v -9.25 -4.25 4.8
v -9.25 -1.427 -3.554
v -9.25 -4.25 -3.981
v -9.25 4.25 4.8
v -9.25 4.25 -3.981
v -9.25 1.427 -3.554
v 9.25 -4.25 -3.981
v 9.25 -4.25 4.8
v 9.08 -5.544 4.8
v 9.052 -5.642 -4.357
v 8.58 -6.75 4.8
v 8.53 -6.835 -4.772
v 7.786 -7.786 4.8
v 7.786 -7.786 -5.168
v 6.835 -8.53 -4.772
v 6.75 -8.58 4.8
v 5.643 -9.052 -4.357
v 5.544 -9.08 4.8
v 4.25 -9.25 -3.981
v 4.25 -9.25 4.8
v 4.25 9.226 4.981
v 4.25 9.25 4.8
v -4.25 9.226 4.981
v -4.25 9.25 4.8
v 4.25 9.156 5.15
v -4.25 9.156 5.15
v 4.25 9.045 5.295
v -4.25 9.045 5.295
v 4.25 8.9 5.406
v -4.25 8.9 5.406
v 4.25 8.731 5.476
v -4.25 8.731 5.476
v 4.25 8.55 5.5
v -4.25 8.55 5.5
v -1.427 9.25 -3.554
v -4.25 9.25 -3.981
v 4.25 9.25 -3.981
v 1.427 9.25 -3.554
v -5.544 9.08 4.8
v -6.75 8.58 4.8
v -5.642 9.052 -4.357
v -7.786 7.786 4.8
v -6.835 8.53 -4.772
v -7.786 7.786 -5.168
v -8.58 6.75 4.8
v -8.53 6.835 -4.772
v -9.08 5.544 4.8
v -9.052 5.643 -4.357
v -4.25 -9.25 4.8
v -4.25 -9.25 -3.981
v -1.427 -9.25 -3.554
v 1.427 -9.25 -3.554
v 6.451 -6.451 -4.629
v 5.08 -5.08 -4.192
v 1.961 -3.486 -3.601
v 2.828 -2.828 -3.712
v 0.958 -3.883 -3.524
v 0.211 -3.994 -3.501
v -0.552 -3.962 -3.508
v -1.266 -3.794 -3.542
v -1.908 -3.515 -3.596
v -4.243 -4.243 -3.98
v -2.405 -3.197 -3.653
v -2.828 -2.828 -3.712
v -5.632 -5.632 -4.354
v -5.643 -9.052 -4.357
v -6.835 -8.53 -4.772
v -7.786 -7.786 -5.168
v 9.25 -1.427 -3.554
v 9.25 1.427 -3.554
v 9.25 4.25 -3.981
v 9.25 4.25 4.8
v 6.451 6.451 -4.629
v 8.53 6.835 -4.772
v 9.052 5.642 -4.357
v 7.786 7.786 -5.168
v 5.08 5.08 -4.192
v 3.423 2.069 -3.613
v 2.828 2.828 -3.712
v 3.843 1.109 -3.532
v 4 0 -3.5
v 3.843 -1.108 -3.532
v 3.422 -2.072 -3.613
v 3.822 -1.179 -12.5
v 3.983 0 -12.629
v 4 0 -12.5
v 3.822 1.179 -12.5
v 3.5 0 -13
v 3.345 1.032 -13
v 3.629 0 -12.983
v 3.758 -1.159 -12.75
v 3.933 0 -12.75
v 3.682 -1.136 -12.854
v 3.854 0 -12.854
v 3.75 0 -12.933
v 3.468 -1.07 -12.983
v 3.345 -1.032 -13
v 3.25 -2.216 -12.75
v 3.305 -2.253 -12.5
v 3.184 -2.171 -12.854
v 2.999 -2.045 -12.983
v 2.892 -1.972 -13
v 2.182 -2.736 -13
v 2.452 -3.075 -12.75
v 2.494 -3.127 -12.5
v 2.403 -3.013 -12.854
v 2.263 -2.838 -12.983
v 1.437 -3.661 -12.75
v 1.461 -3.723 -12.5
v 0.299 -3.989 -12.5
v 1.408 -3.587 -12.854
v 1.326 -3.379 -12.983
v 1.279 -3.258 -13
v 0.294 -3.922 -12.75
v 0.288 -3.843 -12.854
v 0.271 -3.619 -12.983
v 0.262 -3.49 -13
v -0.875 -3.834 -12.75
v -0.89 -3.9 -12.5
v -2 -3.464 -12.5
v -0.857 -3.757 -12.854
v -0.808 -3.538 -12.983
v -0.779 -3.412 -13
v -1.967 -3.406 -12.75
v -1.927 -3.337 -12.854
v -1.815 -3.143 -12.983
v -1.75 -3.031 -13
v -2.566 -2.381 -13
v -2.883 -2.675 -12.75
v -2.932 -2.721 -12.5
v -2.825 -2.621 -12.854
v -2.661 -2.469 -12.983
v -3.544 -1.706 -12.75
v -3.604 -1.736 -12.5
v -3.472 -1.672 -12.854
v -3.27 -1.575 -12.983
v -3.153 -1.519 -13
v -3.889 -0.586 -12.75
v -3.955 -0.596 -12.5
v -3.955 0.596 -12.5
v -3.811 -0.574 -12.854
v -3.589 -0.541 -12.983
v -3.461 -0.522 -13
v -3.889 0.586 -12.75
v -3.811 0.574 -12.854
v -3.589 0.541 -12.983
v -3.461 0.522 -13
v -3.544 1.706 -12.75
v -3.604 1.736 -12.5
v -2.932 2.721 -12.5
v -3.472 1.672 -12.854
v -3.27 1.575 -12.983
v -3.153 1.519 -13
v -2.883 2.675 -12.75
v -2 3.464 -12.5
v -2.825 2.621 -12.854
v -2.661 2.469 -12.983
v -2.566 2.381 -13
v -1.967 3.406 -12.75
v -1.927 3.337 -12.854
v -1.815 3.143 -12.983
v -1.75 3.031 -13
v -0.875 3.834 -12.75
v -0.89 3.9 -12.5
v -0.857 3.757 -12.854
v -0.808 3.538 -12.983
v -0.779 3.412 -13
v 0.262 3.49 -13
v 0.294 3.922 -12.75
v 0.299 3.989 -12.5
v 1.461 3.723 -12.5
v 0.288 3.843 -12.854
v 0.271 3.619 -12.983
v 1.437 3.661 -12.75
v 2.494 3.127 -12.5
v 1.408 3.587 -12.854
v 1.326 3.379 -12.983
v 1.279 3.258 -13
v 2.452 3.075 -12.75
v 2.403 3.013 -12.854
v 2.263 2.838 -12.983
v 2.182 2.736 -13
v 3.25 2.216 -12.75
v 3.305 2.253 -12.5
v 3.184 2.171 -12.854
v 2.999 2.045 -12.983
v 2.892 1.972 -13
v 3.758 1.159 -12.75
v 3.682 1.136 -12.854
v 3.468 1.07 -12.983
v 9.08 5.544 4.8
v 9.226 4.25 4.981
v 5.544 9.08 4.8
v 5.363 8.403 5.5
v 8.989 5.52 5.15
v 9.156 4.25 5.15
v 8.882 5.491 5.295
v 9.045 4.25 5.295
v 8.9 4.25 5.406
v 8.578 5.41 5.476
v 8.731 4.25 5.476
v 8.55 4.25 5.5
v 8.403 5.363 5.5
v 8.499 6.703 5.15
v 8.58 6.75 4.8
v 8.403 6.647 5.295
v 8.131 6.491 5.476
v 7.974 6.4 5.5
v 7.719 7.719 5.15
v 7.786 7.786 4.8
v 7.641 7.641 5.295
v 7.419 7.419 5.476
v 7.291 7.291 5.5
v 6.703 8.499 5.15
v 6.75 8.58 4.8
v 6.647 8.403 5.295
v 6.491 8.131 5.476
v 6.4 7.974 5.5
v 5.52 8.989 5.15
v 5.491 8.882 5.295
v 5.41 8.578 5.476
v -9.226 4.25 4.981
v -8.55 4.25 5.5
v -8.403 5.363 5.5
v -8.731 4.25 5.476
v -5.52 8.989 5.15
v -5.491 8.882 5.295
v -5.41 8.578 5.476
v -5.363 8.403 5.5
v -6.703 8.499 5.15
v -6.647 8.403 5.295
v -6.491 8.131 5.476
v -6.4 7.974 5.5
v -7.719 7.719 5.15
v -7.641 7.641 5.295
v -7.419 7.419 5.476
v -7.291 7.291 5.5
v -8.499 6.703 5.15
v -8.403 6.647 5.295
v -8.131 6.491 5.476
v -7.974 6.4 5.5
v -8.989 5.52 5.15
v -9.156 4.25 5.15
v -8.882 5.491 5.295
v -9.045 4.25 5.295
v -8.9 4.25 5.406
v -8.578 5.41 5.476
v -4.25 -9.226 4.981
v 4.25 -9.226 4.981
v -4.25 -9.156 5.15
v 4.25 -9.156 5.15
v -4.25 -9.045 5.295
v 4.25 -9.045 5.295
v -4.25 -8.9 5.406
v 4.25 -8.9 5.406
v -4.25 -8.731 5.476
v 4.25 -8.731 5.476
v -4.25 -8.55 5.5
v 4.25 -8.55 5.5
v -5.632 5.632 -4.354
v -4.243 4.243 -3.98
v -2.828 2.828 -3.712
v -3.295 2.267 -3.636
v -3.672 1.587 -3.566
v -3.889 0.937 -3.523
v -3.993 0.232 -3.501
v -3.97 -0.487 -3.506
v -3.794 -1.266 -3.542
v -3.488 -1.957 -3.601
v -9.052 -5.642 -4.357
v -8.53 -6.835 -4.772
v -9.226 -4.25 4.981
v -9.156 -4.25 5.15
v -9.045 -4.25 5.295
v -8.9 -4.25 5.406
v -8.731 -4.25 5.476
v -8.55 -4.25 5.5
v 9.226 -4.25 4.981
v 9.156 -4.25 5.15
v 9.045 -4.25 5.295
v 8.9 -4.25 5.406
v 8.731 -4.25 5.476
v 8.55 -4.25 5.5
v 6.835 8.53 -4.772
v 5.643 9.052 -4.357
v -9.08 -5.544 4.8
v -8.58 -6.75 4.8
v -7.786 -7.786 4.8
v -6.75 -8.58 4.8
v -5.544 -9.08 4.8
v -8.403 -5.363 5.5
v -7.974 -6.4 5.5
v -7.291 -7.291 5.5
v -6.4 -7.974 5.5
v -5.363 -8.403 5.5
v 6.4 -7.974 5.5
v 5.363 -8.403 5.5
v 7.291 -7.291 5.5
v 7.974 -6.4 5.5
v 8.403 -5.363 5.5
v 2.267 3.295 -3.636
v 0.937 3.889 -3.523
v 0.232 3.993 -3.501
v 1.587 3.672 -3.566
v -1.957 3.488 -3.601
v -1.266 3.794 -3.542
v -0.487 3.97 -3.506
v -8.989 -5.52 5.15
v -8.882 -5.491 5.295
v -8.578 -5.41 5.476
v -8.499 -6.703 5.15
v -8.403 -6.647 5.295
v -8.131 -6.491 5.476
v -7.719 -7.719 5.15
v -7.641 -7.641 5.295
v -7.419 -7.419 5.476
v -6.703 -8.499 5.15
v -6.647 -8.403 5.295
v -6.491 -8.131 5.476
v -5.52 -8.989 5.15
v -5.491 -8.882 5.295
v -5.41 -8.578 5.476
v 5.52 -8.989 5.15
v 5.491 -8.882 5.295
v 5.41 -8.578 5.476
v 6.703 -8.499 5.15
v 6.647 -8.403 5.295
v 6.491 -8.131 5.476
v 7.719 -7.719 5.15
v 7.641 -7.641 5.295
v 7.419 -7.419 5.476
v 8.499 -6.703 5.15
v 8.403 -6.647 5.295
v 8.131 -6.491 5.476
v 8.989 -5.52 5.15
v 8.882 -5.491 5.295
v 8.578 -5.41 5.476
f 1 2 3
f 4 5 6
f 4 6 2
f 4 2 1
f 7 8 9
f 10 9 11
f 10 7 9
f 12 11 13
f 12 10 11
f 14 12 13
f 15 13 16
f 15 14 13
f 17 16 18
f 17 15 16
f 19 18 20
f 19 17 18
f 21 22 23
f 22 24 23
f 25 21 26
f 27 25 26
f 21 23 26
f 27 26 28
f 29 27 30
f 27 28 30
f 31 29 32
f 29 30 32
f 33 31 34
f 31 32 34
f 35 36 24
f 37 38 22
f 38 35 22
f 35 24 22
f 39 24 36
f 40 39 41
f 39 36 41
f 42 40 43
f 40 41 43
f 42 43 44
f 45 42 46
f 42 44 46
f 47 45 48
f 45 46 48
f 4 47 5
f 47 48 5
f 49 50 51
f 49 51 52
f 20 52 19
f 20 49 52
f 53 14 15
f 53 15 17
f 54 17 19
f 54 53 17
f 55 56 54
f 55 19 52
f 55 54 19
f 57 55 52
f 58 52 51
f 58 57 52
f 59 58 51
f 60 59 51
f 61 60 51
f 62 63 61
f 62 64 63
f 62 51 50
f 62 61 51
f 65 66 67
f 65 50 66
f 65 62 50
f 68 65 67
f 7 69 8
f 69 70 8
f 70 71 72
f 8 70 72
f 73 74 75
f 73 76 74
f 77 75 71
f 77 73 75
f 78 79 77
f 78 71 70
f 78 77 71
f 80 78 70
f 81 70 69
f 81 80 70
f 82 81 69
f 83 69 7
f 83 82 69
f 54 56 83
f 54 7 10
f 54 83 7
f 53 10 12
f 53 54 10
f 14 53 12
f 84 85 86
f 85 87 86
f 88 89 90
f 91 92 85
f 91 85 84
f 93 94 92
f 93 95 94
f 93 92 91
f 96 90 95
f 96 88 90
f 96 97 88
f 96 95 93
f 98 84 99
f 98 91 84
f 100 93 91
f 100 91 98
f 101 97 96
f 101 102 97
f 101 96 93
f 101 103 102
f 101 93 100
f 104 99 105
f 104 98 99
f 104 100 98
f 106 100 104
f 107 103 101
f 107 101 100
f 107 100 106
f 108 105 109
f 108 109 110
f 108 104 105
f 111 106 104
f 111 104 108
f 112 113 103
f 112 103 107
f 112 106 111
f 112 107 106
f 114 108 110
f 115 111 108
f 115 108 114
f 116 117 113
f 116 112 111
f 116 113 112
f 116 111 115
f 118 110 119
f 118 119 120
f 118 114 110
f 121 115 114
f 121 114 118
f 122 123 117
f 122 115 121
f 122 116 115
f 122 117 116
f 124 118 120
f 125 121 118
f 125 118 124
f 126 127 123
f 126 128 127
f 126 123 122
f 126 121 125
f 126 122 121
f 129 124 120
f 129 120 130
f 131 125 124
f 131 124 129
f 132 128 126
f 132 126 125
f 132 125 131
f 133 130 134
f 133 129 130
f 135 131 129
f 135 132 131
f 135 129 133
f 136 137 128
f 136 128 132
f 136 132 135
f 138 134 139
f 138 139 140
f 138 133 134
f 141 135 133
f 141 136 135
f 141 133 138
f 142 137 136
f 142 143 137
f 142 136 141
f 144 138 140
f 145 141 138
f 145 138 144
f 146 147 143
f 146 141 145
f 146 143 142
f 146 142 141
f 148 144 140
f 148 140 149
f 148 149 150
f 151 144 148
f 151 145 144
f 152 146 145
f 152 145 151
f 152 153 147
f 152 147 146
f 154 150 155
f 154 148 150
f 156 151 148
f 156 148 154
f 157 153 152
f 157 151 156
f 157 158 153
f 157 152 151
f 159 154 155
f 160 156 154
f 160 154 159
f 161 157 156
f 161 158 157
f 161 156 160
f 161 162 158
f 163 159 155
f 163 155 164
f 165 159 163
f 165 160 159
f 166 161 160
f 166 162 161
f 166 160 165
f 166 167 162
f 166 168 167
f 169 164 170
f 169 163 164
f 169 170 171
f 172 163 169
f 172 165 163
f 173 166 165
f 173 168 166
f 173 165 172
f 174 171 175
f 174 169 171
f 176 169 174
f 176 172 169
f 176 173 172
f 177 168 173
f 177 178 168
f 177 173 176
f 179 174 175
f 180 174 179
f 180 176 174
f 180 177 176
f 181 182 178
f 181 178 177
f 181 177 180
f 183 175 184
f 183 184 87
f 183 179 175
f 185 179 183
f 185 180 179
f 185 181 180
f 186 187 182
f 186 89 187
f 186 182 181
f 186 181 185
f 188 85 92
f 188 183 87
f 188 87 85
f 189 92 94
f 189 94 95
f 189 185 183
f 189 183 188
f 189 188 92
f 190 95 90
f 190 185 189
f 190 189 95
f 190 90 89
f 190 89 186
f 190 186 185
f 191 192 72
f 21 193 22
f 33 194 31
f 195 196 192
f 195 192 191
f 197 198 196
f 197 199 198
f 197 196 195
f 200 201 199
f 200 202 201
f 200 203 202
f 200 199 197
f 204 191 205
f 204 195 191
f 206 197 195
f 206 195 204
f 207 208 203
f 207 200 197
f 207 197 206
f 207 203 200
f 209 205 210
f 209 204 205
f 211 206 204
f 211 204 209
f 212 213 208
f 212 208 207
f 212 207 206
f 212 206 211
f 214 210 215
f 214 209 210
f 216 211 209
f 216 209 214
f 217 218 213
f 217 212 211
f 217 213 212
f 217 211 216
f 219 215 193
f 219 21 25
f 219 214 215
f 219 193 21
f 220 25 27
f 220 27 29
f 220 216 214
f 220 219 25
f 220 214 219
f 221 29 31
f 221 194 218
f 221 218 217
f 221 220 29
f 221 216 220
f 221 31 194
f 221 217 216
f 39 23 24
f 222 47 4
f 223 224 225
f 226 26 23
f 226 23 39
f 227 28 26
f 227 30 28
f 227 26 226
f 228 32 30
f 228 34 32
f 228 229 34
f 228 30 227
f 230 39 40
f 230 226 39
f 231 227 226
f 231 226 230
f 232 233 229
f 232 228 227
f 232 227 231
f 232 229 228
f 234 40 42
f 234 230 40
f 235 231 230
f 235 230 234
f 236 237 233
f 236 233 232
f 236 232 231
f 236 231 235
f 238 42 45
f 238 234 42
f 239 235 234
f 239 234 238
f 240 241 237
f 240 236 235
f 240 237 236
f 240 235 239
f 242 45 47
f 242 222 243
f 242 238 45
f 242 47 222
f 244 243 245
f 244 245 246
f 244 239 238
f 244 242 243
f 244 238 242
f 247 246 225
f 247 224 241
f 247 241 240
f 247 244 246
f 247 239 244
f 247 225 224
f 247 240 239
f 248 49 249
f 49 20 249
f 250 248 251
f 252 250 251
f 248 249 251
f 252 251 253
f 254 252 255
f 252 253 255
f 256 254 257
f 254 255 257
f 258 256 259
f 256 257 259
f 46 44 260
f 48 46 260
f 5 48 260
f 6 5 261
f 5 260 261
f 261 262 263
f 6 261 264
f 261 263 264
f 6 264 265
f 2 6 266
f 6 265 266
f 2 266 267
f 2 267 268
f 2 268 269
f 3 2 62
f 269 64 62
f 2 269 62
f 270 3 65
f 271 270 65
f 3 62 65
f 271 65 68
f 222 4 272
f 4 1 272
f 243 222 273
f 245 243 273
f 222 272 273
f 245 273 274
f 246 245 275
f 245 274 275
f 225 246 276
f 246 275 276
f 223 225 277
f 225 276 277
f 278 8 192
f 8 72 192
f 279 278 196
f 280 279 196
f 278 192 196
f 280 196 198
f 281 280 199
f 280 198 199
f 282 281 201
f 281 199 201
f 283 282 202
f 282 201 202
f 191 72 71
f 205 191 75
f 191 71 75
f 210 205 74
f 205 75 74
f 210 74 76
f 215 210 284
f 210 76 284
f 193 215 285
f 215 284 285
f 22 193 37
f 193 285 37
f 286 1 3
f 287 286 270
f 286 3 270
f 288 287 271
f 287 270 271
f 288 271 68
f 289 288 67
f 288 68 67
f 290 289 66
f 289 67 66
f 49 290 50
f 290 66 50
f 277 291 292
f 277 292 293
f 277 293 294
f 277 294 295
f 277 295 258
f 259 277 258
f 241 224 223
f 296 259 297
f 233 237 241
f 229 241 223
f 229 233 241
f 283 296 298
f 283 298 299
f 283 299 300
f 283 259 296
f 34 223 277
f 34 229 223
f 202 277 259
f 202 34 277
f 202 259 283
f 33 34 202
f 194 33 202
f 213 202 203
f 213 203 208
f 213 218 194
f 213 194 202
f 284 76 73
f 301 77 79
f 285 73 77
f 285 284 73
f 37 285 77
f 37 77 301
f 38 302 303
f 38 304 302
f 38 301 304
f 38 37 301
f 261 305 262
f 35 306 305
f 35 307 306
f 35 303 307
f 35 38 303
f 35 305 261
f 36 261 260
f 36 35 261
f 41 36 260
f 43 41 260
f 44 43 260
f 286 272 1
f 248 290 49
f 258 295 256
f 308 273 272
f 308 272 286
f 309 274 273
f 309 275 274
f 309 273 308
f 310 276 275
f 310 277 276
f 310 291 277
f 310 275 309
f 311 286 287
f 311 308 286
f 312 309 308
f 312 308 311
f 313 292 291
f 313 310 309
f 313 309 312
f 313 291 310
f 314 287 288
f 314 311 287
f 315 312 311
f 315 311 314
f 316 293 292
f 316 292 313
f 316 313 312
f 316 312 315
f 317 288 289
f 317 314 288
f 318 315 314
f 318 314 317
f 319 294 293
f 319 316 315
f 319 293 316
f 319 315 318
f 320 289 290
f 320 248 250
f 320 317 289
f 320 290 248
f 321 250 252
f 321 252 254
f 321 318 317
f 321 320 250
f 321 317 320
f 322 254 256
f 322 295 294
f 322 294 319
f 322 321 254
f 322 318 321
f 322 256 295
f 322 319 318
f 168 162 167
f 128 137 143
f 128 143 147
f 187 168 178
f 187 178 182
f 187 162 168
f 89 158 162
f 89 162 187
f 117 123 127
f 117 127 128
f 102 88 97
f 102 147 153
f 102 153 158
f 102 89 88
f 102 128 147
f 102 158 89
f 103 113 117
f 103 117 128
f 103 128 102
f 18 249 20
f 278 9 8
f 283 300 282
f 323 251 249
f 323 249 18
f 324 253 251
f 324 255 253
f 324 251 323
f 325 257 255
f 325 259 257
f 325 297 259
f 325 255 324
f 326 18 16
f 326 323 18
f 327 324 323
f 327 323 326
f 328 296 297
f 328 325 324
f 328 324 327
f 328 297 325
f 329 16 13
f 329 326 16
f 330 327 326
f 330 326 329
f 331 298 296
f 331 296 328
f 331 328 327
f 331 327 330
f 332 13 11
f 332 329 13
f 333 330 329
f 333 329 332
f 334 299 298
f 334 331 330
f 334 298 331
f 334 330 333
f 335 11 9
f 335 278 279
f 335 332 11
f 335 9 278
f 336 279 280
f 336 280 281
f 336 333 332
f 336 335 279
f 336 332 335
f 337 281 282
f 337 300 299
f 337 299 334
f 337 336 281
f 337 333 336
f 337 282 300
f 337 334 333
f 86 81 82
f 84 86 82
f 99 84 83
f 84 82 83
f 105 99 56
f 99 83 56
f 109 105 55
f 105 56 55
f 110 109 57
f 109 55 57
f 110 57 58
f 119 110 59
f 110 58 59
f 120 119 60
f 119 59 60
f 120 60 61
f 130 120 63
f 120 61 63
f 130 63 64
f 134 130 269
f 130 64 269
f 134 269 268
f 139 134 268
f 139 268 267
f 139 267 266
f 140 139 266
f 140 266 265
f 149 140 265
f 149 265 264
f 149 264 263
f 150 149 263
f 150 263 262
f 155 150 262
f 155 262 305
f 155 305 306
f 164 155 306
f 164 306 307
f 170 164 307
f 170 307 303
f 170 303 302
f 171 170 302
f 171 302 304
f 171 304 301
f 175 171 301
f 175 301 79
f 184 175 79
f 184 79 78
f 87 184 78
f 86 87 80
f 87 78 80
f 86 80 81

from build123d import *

# Parameters (mm, degrees)
F0_W         = 18.5
F0_H         = 11
F1_DEPTH     = 9.25
F2_DEPTH     = 9.25
F3_R         = 19
F5_DEPTH     = 25.4
F6_DEPTH     = 25.4
F4_R         = 19
F7_DEPTH     = 25.4
F8_DEPTH     = 25.4
F9_R         = 4
F10_DEPTH    = 3.45753
F11_DEPTH    = 7.5
F12_T1_DEPTH = 36
F13_R        = 0.7
F14_R        = 0.5


# Not quite as in the source:
# - a fillet or chamfer that OpenCascade refuses, or shapes differently, is made with other operations: its cross-section is extruded or revolved along the edge and cut away or added
# - a feature names something its author has since deleted; it is built from what else it names


with BuildPart() as f1:
    # F0 (on Front) → F1 (new body)
    with BuildSketch(Plane.XZ):
        Rectangle(F0_W, F0_H)
    extrude(amount=-F1_DEPTH)

    # F0 (on Front) → F2 (join)
    with BuildSketch(Plane.XZ):
        Rectangle(F0_W, F0_H)
    extrude(amount=F2_DEPTH)

    # F3 (on Front) → F5 (cut)
    with BuildSketch(Plane.XZ):
        with Locations((0, -22.5)):
            Circle(F3_R)
    extrude(amount=-F5_DEPTH, mode=Mode.SUBTRACT)

    # F3 (on Front) → F6 (cut)
    with BuildSketch(Plane.XZ):
        with Locations((0, -22.5)):
            Circle(F3_R)
    extrude(amount=F6_DEPTH, mode=Mode.SUBTRACT)

    # F4 (on Right) → F7 (cut)
    with BuildSketch(Plane.YZ):
        with Locations((0, -22.5)):
            Circle(F4_R)
    extrude(amount=-F7_DEPTH, mode=Mode.SUBTRACT)

    # F4 (on Right) → F8 (cut)
    with BuildSketch(Plane.YZ):
        with Locations((0, -22.5)):
            Circle(F4_R)
    extrude(amount=F8_DEPTH, mode=Mode.SUBTRACT)

    # F9 (on face) → F10 (join)
    with BuildSketch(Plane(origin=(0, 0, -5.5), x_dir=(1, 0, 0), z_dir=(0, 0, -1))):
        Circle(F9_R)
    extrude(amount=-F10_DEPTH)

    # F11 (add): a face of the model
    f11_faces = [f1.faces().sort_by_distance(p)[0] for p in [
        (0, 0, -5.5),
    ]]
    extrude(f11_faces, amount=F11_DEPTH)

    # F12: fillet of radius 5 on 4 edges, made by hand

    # F12_s2 → F12_t1 (cut)
    with BuildSketch(Plane.XY.offset(-18)):
        with BuildLine():
            ThreePointArc((-9.25, -4.25), (-7.7855339059, -7.7855339059), (-4.25, -9.25))
            Line((-4.25, -9.25), (-9.25, -9.25))
            Line((-9.25, -9.25), (-9.25, -4.25))
        make_face()
        with BuildLine():
            ThreePointArc((-4.25, 9.25), (-7.7855339059, 7.7855339059), (-9.25, 4.25))
            Line((-9.25, 4.25), (-9.25, 9.25))
            Line((-9.25, 9.25), (-4.25, 9.25))
        make_face()
        with BuildLine():
            ThreePointArc((9.25, 4.25), (7.7855339059, 7.7855339059), (4.25, 9.25))
            Line((4.25, 9.25), (9.25, 9.25))
            Line((9.25, 9.25), (9.25, 4.25))
        make_face()
        with BuildLine():
            ThreePointArc((9.25, -4.25), (7.7855339059, -7.7855339059), (4.25, -9.25))
            Line((4.25, -9.25), (9.25, -9.25))
            Line((9.25, -9.25), (9.25, -4.25))
        make_face()
    extrude(amount=F12_T1_DEPTH, mode=Mode.SUBTRACT)

    # F13
    f13_edges = [f1.edges().sort_by_distance(p)[0] for p in [
        (9.25, 0, 5.5),
        (7.785534, -7.785534, 5.5),
        (0, -9.25, 5.5),
        (-7.785534, -7.785534, 5.5),
        (-9.25, 0, 5.5),
        (-7.785534, 7.785534, 5.5),
        (0, 9.25, 5.5),
        (7.785534, 7.785534, 5.5),
    ]]
    fillet(f13_edges, radius=F13_R)

    # F14
    f14_edges = [f1.edges().sort_by_distance(p)[0] for p in [
        (-4, 0, -13),
    ]]
    fillet(f14_edges, radius=F14_R)


solid = f1.part
